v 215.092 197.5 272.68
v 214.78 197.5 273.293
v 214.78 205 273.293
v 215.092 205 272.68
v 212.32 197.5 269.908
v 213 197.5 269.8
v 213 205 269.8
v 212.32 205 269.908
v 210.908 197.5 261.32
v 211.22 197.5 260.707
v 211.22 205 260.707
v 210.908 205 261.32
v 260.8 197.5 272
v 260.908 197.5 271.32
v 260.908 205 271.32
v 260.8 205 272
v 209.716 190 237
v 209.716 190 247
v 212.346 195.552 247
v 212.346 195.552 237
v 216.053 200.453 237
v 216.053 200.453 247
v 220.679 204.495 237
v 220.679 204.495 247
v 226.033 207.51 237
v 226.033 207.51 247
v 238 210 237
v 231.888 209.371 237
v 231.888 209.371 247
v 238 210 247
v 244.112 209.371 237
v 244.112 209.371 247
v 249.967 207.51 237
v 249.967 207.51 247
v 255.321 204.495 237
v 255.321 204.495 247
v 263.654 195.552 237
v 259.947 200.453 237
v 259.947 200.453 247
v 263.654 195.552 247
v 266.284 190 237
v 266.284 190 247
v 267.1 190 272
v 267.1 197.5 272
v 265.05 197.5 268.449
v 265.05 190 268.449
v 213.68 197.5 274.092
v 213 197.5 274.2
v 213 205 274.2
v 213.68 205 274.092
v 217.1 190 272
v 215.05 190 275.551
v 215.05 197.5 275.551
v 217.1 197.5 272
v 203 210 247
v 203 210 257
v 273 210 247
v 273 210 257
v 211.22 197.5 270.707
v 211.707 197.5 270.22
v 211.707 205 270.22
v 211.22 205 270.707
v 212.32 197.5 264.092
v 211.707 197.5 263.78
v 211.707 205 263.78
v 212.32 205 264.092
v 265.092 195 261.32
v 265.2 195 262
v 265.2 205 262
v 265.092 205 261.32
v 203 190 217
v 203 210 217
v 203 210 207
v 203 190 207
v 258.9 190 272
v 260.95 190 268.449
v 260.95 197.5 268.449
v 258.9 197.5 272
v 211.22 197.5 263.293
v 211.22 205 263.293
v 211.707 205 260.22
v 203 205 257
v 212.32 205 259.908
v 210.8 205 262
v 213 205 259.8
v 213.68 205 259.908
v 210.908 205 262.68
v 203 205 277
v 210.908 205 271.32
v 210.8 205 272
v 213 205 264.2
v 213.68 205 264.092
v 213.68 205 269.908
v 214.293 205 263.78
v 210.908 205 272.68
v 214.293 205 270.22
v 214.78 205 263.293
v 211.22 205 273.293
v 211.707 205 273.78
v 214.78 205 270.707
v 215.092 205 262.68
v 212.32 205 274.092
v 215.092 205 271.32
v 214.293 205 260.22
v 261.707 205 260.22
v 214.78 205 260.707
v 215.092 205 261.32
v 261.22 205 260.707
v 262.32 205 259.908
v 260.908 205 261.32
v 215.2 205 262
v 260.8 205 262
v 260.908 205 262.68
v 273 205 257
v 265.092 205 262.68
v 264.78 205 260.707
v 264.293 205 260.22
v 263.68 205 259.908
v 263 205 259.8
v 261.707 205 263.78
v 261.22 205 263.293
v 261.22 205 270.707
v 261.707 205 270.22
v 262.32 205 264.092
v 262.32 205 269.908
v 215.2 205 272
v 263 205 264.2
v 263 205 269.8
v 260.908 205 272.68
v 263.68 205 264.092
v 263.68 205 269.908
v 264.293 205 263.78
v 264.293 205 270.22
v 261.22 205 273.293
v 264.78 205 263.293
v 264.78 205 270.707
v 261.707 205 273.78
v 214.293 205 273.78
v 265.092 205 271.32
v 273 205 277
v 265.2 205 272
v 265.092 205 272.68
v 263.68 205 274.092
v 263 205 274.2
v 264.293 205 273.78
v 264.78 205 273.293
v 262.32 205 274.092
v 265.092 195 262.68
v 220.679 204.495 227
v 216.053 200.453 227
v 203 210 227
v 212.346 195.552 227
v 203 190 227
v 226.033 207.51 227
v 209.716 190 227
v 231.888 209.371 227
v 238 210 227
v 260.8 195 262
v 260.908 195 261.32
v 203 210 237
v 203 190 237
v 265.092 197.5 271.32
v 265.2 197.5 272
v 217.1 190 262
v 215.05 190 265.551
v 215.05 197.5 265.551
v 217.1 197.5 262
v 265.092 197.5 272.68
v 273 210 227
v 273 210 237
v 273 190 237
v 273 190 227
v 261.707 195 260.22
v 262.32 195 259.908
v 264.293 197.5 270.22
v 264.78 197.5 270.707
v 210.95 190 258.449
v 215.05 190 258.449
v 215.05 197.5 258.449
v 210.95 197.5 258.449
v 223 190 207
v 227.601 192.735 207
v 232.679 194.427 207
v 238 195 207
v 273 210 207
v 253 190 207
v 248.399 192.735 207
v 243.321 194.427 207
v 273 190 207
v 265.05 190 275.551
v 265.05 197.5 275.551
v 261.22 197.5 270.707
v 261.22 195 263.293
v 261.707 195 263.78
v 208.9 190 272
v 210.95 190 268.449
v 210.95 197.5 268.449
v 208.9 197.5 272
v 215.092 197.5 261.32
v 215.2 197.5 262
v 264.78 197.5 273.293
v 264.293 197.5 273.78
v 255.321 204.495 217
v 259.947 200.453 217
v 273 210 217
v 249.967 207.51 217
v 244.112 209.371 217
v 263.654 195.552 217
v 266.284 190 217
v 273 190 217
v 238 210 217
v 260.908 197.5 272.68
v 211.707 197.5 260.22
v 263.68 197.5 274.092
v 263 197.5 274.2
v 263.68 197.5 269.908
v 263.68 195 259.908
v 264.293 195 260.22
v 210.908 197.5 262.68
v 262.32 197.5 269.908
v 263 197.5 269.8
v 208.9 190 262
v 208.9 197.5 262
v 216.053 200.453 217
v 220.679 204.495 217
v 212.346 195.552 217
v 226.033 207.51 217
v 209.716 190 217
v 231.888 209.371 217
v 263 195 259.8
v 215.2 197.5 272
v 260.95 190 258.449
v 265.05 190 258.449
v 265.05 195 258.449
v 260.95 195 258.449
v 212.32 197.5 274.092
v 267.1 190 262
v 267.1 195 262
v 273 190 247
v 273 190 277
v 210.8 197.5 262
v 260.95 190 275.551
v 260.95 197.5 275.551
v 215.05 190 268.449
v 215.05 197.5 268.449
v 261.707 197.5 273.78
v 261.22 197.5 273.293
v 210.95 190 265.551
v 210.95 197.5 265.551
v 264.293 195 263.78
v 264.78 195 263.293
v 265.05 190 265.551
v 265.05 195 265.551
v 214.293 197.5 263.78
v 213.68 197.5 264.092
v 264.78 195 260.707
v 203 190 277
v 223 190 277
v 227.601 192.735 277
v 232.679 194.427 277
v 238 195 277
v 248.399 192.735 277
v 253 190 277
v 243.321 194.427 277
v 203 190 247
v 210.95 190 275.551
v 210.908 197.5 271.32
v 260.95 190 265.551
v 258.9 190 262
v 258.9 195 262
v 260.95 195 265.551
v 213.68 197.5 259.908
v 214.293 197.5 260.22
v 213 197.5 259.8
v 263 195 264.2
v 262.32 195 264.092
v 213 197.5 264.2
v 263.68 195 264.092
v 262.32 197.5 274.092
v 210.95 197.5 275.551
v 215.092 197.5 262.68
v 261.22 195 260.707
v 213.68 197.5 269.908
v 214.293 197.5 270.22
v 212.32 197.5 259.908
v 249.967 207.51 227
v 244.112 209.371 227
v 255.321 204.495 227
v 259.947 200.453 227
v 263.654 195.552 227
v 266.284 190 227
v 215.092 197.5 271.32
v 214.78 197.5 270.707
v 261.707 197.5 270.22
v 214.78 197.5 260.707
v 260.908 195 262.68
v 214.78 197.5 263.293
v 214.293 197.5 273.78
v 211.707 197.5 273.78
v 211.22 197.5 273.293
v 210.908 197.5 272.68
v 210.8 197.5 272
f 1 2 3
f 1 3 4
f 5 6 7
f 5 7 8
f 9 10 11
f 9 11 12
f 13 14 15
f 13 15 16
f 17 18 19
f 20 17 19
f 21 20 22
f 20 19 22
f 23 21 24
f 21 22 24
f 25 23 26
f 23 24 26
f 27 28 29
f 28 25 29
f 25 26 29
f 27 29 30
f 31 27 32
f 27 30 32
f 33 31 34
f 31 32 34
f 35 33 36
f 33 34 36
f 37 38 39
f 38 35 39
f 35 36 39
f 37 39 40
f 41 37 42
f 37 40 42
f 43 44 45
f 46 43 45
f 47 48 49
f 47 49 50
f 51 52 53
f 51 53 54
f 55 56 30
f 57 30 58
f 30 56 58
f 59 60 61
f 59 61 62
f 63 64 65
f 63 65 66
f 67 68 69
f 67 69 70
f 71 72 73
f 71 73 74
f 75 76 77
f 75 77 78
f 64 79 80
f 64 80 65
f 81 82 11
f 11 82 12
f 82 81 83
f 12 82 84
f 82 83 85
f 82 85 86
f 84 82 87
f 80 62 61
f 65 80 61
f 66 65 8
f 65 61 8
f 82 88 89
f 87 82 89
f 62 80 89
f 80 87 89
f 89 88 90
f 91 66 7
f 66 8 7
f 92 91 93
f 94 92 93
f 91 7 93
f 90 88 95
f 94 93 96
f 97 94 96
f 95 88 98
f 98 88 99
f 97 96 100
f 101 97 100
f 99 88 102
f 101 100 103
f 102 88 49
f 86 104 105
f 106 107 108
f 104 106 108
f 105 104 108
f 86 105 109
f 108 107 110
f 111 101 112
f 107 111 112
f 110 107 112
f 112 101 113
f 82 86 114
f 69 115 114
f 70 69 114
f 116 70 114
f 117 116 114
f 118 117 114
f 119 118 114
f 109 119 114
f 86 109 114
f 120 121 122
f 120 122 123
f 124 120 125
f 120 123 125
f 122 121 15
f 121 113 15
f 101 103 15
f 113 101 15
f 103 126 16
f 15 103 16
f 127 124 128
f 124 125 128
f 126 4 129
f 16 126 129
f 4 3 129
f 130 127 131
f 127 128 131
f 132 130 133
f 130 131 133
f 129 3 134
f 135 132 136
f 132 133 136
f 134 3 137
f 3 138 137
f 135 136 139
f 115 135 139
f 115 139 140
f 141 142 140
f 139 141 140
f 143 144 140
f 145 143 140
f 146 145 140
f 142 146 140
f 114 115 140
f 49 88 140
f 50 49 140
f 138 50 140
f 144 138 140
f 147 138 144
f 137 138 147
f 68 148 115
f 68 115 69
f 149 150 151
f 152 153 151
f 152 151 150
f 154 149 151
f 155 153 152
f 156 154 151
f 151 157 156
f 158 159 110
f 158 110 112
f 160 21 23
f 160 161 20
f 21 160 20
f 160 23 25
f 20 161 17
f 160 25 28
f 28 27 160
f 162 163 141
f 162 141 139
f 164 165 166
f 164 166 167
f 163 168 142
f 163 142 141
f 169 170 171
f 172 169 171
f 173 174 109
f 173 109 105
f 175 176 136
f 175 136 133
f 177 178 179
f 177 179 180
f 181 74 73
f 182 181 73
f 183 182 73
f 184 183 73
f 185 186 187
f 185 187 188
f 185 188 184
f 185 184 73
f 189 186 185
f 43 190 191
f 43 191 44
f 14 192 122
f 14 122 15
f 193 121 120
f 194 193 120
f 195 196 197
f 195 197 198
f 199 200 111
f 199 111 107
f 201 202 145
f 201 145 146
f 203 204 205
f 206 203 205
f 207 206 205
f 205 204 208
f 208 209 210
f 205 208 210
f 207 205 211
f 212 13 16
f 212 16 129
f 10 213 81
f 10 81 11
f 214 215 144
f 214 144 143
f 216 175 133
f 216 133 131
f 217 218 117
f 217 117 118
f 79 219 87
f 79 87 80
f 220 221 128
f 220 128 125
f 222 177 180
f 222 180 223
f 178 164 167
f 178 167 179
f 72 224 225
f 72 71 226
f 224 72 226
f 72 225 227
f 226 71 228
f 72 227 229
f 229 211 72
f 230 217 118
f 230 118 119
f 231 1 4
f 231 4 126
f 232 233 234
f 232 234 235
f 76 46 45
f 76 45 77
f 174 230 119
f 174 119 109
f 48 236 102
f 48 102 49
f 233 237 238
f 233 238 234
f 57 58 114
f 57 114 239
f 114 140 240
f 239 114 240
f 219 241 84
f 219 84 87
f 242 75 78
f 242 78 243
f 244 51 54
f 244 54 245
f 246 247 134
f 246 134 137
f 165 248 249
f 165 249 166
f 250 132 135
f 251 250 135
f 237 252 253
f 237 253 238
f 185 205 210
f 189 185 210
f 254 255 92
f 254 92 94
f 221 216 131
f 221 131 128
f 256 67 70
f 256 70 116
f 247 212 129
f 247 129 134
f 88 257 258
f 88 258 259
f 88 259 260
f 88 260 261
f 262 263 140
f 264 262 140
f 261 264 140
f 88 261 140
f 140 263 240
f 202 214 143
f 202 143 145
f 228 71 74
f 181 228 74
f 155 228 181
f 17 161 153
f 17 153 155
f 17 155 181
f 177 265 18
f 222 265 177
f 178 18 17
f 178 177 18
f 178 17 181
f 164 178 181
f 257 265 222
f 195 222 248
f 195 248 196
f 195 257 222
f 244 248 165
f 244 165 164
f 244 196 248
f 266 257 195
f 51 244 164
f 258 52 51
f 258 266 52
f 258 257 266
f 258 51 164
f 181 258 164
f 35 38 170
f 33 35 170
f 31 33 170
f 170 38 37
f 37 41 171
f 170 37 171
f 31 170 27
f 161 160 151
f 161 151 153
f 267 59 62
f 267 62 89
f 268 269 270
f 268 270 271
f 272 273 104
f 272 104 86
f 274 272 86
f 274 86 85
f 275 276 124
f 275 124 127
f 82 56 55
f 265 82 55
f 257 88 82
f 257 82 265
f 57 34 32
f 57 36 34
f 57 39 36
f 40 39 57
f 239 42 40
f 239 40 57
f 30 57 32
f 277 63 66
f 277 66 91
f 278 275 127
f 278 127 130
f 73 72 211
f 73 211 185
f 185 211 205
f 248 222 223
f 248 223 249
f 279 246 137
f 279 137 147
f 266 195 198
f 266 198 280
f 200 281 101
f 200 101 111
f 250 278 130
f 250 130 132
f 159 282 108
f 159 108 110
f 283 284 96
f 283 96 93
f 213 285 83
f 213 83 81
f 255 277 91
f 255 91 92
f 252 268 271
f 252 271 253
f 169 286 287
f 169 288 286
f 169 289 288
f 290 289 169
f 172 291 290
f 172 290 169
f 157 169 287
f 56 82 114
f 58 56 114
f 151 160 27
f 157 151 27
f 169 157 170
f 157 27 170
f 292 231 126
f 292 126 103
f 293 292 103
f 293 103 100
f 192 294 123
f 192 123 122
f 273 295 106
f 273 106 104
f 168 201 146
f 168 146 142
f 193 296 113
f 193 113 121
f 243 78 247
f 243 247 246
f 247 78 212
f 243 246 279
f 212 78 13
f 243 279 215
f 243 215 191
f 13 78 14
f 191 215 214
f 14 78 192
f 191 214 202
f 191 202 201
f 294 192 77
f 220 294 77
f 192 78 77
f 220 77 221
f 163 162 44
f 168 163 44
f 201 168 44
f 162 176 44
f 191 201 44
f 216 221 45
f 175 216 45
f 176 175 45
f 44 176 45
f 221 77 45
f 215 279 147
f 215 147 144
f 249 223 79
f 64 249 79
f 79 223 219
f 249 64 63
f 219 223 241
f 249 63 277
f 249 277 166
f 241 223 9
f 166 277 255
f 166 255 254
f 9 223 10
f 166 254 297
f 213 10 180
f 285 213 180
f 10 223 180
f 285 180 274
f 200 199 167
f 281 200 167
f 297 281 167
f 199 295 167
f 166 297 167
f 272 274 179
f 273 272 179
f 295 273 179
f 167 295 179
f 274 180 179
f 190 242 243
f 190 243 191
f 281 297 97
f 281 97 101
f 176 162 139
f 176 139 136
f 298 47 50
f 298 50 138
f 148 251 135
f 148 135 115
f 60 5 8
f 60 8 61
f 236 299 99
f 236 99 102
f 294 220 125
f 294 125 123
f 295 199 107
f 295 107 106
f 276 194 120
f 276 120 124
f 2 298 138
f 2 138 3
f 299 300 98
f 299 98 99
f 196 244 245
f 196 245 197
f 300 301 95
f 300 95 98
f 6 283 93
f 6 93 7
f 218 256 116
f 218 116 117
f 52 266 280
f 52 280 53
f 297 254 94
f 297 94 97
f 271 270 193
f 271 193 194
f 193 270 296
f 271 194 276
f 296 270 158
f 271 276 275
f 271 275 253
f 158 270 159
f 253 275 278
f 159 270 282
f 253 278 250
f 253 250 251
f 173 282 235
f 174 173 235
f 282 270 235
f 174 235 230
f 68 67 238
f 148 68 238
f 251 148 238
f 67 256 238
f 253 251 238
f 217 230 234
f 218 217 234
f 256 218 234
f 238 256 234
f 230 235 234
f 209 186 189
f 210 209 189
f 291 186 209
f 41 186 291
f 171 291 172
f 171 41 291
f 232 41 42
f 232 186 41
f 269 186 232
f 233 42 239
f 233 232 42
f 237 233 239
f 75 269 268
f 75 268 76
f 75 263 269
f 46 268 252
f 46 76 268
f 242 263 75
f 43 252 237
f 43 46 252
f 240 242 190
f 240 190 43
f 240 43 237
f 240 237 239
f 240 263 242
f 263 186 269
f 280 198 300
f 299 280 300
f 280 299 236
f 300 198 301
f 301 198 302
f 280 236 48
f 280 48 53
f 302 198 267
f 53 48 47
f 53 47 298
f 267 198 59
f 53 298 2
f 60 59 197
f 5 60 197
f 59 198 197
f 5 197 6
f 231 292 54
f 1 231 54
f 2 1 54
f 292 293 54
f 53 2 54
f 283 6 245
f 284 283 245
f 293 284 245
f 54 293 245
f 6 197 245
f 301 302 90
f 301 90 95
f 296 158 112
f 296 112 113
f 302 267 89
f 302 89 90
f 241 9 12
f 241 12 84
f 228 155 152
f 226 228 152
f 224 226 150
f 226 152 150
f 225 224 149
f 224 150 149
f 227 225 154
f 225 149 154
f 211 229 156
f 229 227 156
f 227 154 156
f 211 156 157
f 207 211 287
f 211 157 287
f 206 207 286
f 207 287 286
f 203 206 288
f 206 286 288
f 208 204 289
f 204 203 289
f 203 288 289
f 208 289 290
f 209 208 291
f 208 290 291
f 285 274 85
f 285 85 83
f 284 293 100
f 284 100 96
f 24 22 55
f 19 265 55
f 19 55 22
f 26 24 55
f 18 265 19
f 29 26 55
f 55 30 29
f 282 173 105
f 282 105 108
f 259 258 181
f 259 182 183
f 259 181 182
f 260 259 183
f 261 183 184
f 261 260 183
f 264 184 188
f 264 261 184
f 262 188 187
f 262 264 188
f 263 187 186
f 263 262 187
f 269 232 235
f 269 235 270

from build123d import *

# Parameters (mm, degrees)
CYLINDER022_R                 = 25
CYLINDER022_DEPTH             = 80
CYLINDER024_R                 = 30
CYLINDER024_DEPTH             = 11
CYLINDER023_R                 = 60
CYLINDER023_DEPTH             = 10
CYLINDER026_R                 = 30
CYLINDER026_DEPTH             = 11
CYLINDER025_R                 = 60
CYLINDER025_DEPTH             = 10
PRISM098_DEPTH                = 30
PRISM098_ROLL_ANGLE           = 90
PRISM099_DEPTH                = 10
PRISM099_ROLL_ANGLE           = 90
PRISM100_DEPTH                = 30
PRISM100_ROLL_ANGLE           = 90
PRISM101_DEPTH                = 15
PRISM101_ROLL_ANGLE           = 90
PRISM102_DEPTH                = 30
PRISM102_ROLL_ANGLE           = 90
PRISM103_DEPTH                = 15
PRISM103_ROLL_ANGLE           = 90
PRISM104_DEPTH                = 30
PRISM104_ROLL_ANGLE           = 90
PRISM105_DEPTH                = 15
PRISM105_ROLL_ANGLE           = 90
CUBE094_W                     = 70
CUBE094_H                     = 10
CUBE094_DEPTH                 = 20
CUBE093_W                     = 70
CUBE093_H                     = 20
CUBE093_DEPTH                 = 70
DIFFERENCE058_PLACEMENT_ANGLE = 180


with BuildPart() as cylinder022:
    # cylinder022 → cylinder022 (new body)
    with BuildSketch(Plane(origin=(0, 30, -40), x_dir=(1, 0, 0), z_dir=(0, 0, 1))):
        Circle(CYLINDER022_R)
    extrude(amount=CYLINDER022_DEPTH)


with BuildPart() as cylinder024:
    # cylinder024 → cylinder024 (new body)
    with BuildSketch(Plane(origin=(0, 20, -5.5), x_dir=(1, 0, 0), z_dir=(0, 0, 1))):
        Circle(CYLINDER024_R)
    extrude(amount=CYLINDER024_DEPTH)


with BuildPart() as difference056:
    # cylinder023 → cylinder023 (new body)
    with BuildSketch(Plane(origin=(0, 20, -5), x_dir=(1, 0, 0), z_dir=(0, 0, 1))):
        Circle(CYLINDER023_R)
    extrude(amount=CYLINDER023_DEPTH)

    # difference056: cut cylinder024
    add(cylinder024.part, mode=Mode.SUBTRACT)


with BuildPart() as cylinder026:
    # cylinder026 → cylinder026 (new body)
    with BuildSketch(Plane(origin=(0, 20, 14.5), x_dir=(1, 0, 0), z_dir=(0, 0, 1))):
        Circle(CYLINDER026_R)
    extrude(amount=CYLINDER026_DEPTH)


with BuildPart() as difference057:
    # cylinder025 → cylinder025 (new body)
    with BuildSketch(Plane(origin=(0, 20, 15), x_dir=(1, 0, 0), z_dir=(0, 0, 1))):
        Circle(CYLINDER025_R)
    extrude(amount=CYLINDER025_DEPTH)

    # difference057: cut cylinder026
    add(cylinder026.part, mode=Mode.SUBTRACT)


with BuildPart() as prism098:
    # prism098 → prism098 (new body)
    with BuildSketch(Plane.XY):
        Polygon((2.2, 0), (2.092324, 0.679837), (1.779837, 1.293128), (1.293128, 1.779837), (0.679837, 2.092324), (0, 2.2), (-0.679837, 2.092324), (-1.293128, 1.779837), (-1.779837, 1.293128), (-2.092324, 0.679837), (-2.2, 0), (-2.092324, -0.679837), (-1.779837, -1.293128), (-1.293128, -1.779837), (-0.679837, -2.092324), (0, -2.2), (0.679837, -2.092324), (1.293128, -1.779837), (1.779837, -1.293128), (2.092324, -0.679837), align=None)
    extrude(amount=PRISM098_DEPTH)


with BuildPart() as prism098_1:
    # prism098 roll: moved
    add(prism098.part.rotate(Axis((0, 0, 0), (1, 0, 0)), PRISM098_ROLL_ANGLE))


with BuildPart() as prism098_2:
    # prism098 placement: moved
    add(prism098_1.part.moved(Location((25, 15, -20))))


with BuildPart() as prism099:
    # prism099 → prism099 (new body)
    with BuildSketch(Plane.XY):
        Polygon((4.1, 0), (2.05, 3.550704), (-2.05, 3.550704), (-4.1, 0), (-2.05, -3.550704), (2.05, -3.550704), align=None)
    extrude(amount=PRISM099_DEPTH)


with BuildPart() as prism099_1:
    # prism099 roll: moved
    add(prism099.part.rotate(Axis((0, 0, 0), (1, 0, 0)), PRISM099_ROLL_ANGLE))


with BuildPart() as prism099_2:
    # prism099 placement: moved
    add(prism099_1.part.moved(Location((25, 15, -20))))


with BuildPart() as prism100:
    # prism100 → prism100 (new body)
    with BuildSketch(Plane.XY):
        Polygon((2.2, 0), (2.092324, 0.679837), (1.779837, 1.293128), (1.293128, 1.779837), (0.679837, 2.092324), (0, 2.2), (-0.679837, 2.092324), (-1.293128, 1.779837), (-1.779837, 1.293128), (-2.092324, 0.679837), (-2.2, 0), (-2.092324, -0.679837), (-1.779837, -1.293128), (-1.293128, -1.779837), (-0.679837, -2.092324), (0, -2.2), (0.679837, -2.092324), (1.293128, -1.779837), (1.779837, -1.293128), (2.092324, -0.679837), align=None)
    extrude(amount=PRISM100_DEPTH)


with BuildPart() as prism100_1:
    # prism100 roll: moved
    add(prism100.part.rotate(Axis((0, 0, 0), (1, 0, 0)), PRISM100_ROLL_ANGLE))


with BuildPart() as prism100_2:
    # prism100 placement: moved
    add(prism100_1.part.moved(Location((25, 15, -30))))


with BuildPart() as prism101:
    # prism101 → prism101 (new body)
    with BuildSketch(Plane.XY):
        Polygon((4.1, 0), (2.05, 3.550704), (-2.05, 3.550704), (-4.1, 0), (-2.05, -3.550704), (2.05, -3.550704), align=None)
    extrude(amount=PRISM101_DEPTH)


with BuildPart() as prism101_1:
    # prism101 roll: moved
    add(prism101.part.rotate(Axis((0, 0, 0), (1, 0, 0)), PRISM101_ROLL_ANGLE))


with BuildPart() as prism101_2:
    # prism101 placement: moved
    add(prism101_1.part.moved(Location((25, 17.5, -30))))


with BuildPart() as prism102:
    # prism102 → prism102 (new body)
    with BuildSketch(Plane.XY):
        Polygon((2.2, 0), (2.092324, 0.679837), (1.779837, 1.293128), (1.293128, 1.779837), (0.679837, 2.092324), (0, 2.2), (-0.679837, 2.092324), (-1.293128, 1.779837), (-1.779837, 1.293128), (-2.092324, 0.679837), (-2.2, 0), (-2.092324, -0.679837), (-1.779837, -1.293128), (-1.293128, -1.779837), (-0.679837, -2.092324), (0, -2.2), (0.679837, -2.092324), (1.293128, -1.779837), (1.779837, -1.293128), (2.092324, -0.679837), align=None)
    extrude(amount=PRISM102_DEPTH)


with BuildPart() as prism102_1:
    # prism102 roll: moved
    add(prism102.part.rotate(Axis((0, 0, 0), (1, 0, 0)), PRISM102_ROLL_ANGLE))


with BuildPart() as prism102_2:
    # prism102 placement: moved
    add(prism102_1.part.moved(Location((-25, 15, -20))))


with BuildPart() as prism103:
    # prism103 → prism103 (new body)
    with BuildSketch(Plane.XY):
        Polygon((4.1, 0), (2.05, 3.550704), (-2.05, 3.550704), (-4.1, 0), (-2.05, -3.550704), (2.05, -3.550704), align=None)
    extrude(amount=PRISM103_DEPTH)


with BuildPart() as prism103_1:
    # prism103 roll: moved
    add(prism103.part.rotate(Axis((0, 0, 0), (1, 0, 0)), PRISM103_ROLL_ANGLE))


with BuildPart() as prism103_2:
    # prism103 placement: moved
    add(prism103_1.part.moved(Location((-25, 17.5, -20))))


with BuildPart() as prism104:
    # prism104 → prism104 (new body)
    with BuildSketch(Plane.XY):
        Polygon((2.2, 0), (2.092324, 0.679837), (1.779837, 1.293128), (1.293128, 1.779837), (0.679837, 2.092324), (0, 2.2), (-0.679837, 2.092324), (-1.293128, 1.779837), (-1.779837, 1.293128), (-2.092324, 0.679837), (-2.2, 0), (-2.092324, -0.679837), (-1.779837, -1.293128), (-1.293128, -1.779837), (-0.679837, -2.092324), (0, -2.2), (0.679837, -2.092324), (1.293128, -1.779837), (1.779837, -1.293128), (2.092324, -0.679837), align=None)
    extrude(amount=PRISM104_DEPTH)


with BuildPart() as prism104_1:
    # prism104 roll: moved
    add(prism104.part.rotate(Axis((0, 0, 0), (1, 0, 0)), PRISM104_ROLL_ANGLE))


with BuildPart() as prism104_2:
    # prism104 placement: moved
    add(prism104_1.part.moved(Location((-25, 15, -30))))


with BuildPart() as prism105:
    # prism105 → prism105 (new body)
    with BuildSketch(Plane.XY):
        Polygon((4.1, 0), (2.05, 3.550704), (-2.05, 3.550704), (-4.1, 0), (-2.05, -3.550704), (2.05, -3.550704), align=None)
    extrude(amount=PRISM105_DEPTH)


with BuildPart() as prism105_1:
    # prism105 roll: moved
    add(prism105.part.rotate(Axis((0, 0, 0), (1, 0, 0)), PRISM105_ROLL_ANGLE))


with BuildPart() as prism105_2:
    # prism105 placement: moved
    add(prism105_1.part.moved(Location((-25, 17.5, -30))))


with BuildPart() as union045:
    # cube094 → cube094 (new body)
    with BuildSketch(Plane(origin=(-35, -15, -35), x_dir=(1, 0, 0), z_dir=(0, 0, 1))):
        with Locations((35, 5)):
            Rectangle(CUBE094_W, CUBE094_H)
    extrude(amount=CUBE094_DEPTH)

    # union045: union cylinder022, difference056, difference057, prism098, prism099, prism100, prism101, prism102, prism103, prism104, prism105
    add(cylinder022.part)
    add(difference056.part)
    add(difference057.part)
    add(prism098_2.part)
    add(prism099_2.part)
    add(prism100_2.part)
    add(prism101_2.part)
    add(prism102_2.part)
    add(prism103_2.part)
    add(prism104_2.part)
    add(prism105_2.part)


with BuildPart() as tool_holder:
    # cube093 → cube093 (new body)
    with BuildSketch(Plane(origin=(-35, -10, -35), x_dir=(1, 0, 0), z_dir=(0, 0, 1))):
        with Locations((35, 10)):
            Rectangle(CUBE093_W, CUBE093_H)
    extrude(amount=CUBE093_DEPTH)

    # difference058: cut union045
    add(union045.part, mode=Mode.SUBTRACT)


with BuildPart() as tool_holder_1:
    # difference058 placement: moved
    add(tool_holder.part.moved(Location((238, 200, 242))).rotate(Axis((238, 200, 242), (1, 0, 0)), DIFFERENCE058_PLACEMENT_ANGLE))


solid = tool_holder_1.part
